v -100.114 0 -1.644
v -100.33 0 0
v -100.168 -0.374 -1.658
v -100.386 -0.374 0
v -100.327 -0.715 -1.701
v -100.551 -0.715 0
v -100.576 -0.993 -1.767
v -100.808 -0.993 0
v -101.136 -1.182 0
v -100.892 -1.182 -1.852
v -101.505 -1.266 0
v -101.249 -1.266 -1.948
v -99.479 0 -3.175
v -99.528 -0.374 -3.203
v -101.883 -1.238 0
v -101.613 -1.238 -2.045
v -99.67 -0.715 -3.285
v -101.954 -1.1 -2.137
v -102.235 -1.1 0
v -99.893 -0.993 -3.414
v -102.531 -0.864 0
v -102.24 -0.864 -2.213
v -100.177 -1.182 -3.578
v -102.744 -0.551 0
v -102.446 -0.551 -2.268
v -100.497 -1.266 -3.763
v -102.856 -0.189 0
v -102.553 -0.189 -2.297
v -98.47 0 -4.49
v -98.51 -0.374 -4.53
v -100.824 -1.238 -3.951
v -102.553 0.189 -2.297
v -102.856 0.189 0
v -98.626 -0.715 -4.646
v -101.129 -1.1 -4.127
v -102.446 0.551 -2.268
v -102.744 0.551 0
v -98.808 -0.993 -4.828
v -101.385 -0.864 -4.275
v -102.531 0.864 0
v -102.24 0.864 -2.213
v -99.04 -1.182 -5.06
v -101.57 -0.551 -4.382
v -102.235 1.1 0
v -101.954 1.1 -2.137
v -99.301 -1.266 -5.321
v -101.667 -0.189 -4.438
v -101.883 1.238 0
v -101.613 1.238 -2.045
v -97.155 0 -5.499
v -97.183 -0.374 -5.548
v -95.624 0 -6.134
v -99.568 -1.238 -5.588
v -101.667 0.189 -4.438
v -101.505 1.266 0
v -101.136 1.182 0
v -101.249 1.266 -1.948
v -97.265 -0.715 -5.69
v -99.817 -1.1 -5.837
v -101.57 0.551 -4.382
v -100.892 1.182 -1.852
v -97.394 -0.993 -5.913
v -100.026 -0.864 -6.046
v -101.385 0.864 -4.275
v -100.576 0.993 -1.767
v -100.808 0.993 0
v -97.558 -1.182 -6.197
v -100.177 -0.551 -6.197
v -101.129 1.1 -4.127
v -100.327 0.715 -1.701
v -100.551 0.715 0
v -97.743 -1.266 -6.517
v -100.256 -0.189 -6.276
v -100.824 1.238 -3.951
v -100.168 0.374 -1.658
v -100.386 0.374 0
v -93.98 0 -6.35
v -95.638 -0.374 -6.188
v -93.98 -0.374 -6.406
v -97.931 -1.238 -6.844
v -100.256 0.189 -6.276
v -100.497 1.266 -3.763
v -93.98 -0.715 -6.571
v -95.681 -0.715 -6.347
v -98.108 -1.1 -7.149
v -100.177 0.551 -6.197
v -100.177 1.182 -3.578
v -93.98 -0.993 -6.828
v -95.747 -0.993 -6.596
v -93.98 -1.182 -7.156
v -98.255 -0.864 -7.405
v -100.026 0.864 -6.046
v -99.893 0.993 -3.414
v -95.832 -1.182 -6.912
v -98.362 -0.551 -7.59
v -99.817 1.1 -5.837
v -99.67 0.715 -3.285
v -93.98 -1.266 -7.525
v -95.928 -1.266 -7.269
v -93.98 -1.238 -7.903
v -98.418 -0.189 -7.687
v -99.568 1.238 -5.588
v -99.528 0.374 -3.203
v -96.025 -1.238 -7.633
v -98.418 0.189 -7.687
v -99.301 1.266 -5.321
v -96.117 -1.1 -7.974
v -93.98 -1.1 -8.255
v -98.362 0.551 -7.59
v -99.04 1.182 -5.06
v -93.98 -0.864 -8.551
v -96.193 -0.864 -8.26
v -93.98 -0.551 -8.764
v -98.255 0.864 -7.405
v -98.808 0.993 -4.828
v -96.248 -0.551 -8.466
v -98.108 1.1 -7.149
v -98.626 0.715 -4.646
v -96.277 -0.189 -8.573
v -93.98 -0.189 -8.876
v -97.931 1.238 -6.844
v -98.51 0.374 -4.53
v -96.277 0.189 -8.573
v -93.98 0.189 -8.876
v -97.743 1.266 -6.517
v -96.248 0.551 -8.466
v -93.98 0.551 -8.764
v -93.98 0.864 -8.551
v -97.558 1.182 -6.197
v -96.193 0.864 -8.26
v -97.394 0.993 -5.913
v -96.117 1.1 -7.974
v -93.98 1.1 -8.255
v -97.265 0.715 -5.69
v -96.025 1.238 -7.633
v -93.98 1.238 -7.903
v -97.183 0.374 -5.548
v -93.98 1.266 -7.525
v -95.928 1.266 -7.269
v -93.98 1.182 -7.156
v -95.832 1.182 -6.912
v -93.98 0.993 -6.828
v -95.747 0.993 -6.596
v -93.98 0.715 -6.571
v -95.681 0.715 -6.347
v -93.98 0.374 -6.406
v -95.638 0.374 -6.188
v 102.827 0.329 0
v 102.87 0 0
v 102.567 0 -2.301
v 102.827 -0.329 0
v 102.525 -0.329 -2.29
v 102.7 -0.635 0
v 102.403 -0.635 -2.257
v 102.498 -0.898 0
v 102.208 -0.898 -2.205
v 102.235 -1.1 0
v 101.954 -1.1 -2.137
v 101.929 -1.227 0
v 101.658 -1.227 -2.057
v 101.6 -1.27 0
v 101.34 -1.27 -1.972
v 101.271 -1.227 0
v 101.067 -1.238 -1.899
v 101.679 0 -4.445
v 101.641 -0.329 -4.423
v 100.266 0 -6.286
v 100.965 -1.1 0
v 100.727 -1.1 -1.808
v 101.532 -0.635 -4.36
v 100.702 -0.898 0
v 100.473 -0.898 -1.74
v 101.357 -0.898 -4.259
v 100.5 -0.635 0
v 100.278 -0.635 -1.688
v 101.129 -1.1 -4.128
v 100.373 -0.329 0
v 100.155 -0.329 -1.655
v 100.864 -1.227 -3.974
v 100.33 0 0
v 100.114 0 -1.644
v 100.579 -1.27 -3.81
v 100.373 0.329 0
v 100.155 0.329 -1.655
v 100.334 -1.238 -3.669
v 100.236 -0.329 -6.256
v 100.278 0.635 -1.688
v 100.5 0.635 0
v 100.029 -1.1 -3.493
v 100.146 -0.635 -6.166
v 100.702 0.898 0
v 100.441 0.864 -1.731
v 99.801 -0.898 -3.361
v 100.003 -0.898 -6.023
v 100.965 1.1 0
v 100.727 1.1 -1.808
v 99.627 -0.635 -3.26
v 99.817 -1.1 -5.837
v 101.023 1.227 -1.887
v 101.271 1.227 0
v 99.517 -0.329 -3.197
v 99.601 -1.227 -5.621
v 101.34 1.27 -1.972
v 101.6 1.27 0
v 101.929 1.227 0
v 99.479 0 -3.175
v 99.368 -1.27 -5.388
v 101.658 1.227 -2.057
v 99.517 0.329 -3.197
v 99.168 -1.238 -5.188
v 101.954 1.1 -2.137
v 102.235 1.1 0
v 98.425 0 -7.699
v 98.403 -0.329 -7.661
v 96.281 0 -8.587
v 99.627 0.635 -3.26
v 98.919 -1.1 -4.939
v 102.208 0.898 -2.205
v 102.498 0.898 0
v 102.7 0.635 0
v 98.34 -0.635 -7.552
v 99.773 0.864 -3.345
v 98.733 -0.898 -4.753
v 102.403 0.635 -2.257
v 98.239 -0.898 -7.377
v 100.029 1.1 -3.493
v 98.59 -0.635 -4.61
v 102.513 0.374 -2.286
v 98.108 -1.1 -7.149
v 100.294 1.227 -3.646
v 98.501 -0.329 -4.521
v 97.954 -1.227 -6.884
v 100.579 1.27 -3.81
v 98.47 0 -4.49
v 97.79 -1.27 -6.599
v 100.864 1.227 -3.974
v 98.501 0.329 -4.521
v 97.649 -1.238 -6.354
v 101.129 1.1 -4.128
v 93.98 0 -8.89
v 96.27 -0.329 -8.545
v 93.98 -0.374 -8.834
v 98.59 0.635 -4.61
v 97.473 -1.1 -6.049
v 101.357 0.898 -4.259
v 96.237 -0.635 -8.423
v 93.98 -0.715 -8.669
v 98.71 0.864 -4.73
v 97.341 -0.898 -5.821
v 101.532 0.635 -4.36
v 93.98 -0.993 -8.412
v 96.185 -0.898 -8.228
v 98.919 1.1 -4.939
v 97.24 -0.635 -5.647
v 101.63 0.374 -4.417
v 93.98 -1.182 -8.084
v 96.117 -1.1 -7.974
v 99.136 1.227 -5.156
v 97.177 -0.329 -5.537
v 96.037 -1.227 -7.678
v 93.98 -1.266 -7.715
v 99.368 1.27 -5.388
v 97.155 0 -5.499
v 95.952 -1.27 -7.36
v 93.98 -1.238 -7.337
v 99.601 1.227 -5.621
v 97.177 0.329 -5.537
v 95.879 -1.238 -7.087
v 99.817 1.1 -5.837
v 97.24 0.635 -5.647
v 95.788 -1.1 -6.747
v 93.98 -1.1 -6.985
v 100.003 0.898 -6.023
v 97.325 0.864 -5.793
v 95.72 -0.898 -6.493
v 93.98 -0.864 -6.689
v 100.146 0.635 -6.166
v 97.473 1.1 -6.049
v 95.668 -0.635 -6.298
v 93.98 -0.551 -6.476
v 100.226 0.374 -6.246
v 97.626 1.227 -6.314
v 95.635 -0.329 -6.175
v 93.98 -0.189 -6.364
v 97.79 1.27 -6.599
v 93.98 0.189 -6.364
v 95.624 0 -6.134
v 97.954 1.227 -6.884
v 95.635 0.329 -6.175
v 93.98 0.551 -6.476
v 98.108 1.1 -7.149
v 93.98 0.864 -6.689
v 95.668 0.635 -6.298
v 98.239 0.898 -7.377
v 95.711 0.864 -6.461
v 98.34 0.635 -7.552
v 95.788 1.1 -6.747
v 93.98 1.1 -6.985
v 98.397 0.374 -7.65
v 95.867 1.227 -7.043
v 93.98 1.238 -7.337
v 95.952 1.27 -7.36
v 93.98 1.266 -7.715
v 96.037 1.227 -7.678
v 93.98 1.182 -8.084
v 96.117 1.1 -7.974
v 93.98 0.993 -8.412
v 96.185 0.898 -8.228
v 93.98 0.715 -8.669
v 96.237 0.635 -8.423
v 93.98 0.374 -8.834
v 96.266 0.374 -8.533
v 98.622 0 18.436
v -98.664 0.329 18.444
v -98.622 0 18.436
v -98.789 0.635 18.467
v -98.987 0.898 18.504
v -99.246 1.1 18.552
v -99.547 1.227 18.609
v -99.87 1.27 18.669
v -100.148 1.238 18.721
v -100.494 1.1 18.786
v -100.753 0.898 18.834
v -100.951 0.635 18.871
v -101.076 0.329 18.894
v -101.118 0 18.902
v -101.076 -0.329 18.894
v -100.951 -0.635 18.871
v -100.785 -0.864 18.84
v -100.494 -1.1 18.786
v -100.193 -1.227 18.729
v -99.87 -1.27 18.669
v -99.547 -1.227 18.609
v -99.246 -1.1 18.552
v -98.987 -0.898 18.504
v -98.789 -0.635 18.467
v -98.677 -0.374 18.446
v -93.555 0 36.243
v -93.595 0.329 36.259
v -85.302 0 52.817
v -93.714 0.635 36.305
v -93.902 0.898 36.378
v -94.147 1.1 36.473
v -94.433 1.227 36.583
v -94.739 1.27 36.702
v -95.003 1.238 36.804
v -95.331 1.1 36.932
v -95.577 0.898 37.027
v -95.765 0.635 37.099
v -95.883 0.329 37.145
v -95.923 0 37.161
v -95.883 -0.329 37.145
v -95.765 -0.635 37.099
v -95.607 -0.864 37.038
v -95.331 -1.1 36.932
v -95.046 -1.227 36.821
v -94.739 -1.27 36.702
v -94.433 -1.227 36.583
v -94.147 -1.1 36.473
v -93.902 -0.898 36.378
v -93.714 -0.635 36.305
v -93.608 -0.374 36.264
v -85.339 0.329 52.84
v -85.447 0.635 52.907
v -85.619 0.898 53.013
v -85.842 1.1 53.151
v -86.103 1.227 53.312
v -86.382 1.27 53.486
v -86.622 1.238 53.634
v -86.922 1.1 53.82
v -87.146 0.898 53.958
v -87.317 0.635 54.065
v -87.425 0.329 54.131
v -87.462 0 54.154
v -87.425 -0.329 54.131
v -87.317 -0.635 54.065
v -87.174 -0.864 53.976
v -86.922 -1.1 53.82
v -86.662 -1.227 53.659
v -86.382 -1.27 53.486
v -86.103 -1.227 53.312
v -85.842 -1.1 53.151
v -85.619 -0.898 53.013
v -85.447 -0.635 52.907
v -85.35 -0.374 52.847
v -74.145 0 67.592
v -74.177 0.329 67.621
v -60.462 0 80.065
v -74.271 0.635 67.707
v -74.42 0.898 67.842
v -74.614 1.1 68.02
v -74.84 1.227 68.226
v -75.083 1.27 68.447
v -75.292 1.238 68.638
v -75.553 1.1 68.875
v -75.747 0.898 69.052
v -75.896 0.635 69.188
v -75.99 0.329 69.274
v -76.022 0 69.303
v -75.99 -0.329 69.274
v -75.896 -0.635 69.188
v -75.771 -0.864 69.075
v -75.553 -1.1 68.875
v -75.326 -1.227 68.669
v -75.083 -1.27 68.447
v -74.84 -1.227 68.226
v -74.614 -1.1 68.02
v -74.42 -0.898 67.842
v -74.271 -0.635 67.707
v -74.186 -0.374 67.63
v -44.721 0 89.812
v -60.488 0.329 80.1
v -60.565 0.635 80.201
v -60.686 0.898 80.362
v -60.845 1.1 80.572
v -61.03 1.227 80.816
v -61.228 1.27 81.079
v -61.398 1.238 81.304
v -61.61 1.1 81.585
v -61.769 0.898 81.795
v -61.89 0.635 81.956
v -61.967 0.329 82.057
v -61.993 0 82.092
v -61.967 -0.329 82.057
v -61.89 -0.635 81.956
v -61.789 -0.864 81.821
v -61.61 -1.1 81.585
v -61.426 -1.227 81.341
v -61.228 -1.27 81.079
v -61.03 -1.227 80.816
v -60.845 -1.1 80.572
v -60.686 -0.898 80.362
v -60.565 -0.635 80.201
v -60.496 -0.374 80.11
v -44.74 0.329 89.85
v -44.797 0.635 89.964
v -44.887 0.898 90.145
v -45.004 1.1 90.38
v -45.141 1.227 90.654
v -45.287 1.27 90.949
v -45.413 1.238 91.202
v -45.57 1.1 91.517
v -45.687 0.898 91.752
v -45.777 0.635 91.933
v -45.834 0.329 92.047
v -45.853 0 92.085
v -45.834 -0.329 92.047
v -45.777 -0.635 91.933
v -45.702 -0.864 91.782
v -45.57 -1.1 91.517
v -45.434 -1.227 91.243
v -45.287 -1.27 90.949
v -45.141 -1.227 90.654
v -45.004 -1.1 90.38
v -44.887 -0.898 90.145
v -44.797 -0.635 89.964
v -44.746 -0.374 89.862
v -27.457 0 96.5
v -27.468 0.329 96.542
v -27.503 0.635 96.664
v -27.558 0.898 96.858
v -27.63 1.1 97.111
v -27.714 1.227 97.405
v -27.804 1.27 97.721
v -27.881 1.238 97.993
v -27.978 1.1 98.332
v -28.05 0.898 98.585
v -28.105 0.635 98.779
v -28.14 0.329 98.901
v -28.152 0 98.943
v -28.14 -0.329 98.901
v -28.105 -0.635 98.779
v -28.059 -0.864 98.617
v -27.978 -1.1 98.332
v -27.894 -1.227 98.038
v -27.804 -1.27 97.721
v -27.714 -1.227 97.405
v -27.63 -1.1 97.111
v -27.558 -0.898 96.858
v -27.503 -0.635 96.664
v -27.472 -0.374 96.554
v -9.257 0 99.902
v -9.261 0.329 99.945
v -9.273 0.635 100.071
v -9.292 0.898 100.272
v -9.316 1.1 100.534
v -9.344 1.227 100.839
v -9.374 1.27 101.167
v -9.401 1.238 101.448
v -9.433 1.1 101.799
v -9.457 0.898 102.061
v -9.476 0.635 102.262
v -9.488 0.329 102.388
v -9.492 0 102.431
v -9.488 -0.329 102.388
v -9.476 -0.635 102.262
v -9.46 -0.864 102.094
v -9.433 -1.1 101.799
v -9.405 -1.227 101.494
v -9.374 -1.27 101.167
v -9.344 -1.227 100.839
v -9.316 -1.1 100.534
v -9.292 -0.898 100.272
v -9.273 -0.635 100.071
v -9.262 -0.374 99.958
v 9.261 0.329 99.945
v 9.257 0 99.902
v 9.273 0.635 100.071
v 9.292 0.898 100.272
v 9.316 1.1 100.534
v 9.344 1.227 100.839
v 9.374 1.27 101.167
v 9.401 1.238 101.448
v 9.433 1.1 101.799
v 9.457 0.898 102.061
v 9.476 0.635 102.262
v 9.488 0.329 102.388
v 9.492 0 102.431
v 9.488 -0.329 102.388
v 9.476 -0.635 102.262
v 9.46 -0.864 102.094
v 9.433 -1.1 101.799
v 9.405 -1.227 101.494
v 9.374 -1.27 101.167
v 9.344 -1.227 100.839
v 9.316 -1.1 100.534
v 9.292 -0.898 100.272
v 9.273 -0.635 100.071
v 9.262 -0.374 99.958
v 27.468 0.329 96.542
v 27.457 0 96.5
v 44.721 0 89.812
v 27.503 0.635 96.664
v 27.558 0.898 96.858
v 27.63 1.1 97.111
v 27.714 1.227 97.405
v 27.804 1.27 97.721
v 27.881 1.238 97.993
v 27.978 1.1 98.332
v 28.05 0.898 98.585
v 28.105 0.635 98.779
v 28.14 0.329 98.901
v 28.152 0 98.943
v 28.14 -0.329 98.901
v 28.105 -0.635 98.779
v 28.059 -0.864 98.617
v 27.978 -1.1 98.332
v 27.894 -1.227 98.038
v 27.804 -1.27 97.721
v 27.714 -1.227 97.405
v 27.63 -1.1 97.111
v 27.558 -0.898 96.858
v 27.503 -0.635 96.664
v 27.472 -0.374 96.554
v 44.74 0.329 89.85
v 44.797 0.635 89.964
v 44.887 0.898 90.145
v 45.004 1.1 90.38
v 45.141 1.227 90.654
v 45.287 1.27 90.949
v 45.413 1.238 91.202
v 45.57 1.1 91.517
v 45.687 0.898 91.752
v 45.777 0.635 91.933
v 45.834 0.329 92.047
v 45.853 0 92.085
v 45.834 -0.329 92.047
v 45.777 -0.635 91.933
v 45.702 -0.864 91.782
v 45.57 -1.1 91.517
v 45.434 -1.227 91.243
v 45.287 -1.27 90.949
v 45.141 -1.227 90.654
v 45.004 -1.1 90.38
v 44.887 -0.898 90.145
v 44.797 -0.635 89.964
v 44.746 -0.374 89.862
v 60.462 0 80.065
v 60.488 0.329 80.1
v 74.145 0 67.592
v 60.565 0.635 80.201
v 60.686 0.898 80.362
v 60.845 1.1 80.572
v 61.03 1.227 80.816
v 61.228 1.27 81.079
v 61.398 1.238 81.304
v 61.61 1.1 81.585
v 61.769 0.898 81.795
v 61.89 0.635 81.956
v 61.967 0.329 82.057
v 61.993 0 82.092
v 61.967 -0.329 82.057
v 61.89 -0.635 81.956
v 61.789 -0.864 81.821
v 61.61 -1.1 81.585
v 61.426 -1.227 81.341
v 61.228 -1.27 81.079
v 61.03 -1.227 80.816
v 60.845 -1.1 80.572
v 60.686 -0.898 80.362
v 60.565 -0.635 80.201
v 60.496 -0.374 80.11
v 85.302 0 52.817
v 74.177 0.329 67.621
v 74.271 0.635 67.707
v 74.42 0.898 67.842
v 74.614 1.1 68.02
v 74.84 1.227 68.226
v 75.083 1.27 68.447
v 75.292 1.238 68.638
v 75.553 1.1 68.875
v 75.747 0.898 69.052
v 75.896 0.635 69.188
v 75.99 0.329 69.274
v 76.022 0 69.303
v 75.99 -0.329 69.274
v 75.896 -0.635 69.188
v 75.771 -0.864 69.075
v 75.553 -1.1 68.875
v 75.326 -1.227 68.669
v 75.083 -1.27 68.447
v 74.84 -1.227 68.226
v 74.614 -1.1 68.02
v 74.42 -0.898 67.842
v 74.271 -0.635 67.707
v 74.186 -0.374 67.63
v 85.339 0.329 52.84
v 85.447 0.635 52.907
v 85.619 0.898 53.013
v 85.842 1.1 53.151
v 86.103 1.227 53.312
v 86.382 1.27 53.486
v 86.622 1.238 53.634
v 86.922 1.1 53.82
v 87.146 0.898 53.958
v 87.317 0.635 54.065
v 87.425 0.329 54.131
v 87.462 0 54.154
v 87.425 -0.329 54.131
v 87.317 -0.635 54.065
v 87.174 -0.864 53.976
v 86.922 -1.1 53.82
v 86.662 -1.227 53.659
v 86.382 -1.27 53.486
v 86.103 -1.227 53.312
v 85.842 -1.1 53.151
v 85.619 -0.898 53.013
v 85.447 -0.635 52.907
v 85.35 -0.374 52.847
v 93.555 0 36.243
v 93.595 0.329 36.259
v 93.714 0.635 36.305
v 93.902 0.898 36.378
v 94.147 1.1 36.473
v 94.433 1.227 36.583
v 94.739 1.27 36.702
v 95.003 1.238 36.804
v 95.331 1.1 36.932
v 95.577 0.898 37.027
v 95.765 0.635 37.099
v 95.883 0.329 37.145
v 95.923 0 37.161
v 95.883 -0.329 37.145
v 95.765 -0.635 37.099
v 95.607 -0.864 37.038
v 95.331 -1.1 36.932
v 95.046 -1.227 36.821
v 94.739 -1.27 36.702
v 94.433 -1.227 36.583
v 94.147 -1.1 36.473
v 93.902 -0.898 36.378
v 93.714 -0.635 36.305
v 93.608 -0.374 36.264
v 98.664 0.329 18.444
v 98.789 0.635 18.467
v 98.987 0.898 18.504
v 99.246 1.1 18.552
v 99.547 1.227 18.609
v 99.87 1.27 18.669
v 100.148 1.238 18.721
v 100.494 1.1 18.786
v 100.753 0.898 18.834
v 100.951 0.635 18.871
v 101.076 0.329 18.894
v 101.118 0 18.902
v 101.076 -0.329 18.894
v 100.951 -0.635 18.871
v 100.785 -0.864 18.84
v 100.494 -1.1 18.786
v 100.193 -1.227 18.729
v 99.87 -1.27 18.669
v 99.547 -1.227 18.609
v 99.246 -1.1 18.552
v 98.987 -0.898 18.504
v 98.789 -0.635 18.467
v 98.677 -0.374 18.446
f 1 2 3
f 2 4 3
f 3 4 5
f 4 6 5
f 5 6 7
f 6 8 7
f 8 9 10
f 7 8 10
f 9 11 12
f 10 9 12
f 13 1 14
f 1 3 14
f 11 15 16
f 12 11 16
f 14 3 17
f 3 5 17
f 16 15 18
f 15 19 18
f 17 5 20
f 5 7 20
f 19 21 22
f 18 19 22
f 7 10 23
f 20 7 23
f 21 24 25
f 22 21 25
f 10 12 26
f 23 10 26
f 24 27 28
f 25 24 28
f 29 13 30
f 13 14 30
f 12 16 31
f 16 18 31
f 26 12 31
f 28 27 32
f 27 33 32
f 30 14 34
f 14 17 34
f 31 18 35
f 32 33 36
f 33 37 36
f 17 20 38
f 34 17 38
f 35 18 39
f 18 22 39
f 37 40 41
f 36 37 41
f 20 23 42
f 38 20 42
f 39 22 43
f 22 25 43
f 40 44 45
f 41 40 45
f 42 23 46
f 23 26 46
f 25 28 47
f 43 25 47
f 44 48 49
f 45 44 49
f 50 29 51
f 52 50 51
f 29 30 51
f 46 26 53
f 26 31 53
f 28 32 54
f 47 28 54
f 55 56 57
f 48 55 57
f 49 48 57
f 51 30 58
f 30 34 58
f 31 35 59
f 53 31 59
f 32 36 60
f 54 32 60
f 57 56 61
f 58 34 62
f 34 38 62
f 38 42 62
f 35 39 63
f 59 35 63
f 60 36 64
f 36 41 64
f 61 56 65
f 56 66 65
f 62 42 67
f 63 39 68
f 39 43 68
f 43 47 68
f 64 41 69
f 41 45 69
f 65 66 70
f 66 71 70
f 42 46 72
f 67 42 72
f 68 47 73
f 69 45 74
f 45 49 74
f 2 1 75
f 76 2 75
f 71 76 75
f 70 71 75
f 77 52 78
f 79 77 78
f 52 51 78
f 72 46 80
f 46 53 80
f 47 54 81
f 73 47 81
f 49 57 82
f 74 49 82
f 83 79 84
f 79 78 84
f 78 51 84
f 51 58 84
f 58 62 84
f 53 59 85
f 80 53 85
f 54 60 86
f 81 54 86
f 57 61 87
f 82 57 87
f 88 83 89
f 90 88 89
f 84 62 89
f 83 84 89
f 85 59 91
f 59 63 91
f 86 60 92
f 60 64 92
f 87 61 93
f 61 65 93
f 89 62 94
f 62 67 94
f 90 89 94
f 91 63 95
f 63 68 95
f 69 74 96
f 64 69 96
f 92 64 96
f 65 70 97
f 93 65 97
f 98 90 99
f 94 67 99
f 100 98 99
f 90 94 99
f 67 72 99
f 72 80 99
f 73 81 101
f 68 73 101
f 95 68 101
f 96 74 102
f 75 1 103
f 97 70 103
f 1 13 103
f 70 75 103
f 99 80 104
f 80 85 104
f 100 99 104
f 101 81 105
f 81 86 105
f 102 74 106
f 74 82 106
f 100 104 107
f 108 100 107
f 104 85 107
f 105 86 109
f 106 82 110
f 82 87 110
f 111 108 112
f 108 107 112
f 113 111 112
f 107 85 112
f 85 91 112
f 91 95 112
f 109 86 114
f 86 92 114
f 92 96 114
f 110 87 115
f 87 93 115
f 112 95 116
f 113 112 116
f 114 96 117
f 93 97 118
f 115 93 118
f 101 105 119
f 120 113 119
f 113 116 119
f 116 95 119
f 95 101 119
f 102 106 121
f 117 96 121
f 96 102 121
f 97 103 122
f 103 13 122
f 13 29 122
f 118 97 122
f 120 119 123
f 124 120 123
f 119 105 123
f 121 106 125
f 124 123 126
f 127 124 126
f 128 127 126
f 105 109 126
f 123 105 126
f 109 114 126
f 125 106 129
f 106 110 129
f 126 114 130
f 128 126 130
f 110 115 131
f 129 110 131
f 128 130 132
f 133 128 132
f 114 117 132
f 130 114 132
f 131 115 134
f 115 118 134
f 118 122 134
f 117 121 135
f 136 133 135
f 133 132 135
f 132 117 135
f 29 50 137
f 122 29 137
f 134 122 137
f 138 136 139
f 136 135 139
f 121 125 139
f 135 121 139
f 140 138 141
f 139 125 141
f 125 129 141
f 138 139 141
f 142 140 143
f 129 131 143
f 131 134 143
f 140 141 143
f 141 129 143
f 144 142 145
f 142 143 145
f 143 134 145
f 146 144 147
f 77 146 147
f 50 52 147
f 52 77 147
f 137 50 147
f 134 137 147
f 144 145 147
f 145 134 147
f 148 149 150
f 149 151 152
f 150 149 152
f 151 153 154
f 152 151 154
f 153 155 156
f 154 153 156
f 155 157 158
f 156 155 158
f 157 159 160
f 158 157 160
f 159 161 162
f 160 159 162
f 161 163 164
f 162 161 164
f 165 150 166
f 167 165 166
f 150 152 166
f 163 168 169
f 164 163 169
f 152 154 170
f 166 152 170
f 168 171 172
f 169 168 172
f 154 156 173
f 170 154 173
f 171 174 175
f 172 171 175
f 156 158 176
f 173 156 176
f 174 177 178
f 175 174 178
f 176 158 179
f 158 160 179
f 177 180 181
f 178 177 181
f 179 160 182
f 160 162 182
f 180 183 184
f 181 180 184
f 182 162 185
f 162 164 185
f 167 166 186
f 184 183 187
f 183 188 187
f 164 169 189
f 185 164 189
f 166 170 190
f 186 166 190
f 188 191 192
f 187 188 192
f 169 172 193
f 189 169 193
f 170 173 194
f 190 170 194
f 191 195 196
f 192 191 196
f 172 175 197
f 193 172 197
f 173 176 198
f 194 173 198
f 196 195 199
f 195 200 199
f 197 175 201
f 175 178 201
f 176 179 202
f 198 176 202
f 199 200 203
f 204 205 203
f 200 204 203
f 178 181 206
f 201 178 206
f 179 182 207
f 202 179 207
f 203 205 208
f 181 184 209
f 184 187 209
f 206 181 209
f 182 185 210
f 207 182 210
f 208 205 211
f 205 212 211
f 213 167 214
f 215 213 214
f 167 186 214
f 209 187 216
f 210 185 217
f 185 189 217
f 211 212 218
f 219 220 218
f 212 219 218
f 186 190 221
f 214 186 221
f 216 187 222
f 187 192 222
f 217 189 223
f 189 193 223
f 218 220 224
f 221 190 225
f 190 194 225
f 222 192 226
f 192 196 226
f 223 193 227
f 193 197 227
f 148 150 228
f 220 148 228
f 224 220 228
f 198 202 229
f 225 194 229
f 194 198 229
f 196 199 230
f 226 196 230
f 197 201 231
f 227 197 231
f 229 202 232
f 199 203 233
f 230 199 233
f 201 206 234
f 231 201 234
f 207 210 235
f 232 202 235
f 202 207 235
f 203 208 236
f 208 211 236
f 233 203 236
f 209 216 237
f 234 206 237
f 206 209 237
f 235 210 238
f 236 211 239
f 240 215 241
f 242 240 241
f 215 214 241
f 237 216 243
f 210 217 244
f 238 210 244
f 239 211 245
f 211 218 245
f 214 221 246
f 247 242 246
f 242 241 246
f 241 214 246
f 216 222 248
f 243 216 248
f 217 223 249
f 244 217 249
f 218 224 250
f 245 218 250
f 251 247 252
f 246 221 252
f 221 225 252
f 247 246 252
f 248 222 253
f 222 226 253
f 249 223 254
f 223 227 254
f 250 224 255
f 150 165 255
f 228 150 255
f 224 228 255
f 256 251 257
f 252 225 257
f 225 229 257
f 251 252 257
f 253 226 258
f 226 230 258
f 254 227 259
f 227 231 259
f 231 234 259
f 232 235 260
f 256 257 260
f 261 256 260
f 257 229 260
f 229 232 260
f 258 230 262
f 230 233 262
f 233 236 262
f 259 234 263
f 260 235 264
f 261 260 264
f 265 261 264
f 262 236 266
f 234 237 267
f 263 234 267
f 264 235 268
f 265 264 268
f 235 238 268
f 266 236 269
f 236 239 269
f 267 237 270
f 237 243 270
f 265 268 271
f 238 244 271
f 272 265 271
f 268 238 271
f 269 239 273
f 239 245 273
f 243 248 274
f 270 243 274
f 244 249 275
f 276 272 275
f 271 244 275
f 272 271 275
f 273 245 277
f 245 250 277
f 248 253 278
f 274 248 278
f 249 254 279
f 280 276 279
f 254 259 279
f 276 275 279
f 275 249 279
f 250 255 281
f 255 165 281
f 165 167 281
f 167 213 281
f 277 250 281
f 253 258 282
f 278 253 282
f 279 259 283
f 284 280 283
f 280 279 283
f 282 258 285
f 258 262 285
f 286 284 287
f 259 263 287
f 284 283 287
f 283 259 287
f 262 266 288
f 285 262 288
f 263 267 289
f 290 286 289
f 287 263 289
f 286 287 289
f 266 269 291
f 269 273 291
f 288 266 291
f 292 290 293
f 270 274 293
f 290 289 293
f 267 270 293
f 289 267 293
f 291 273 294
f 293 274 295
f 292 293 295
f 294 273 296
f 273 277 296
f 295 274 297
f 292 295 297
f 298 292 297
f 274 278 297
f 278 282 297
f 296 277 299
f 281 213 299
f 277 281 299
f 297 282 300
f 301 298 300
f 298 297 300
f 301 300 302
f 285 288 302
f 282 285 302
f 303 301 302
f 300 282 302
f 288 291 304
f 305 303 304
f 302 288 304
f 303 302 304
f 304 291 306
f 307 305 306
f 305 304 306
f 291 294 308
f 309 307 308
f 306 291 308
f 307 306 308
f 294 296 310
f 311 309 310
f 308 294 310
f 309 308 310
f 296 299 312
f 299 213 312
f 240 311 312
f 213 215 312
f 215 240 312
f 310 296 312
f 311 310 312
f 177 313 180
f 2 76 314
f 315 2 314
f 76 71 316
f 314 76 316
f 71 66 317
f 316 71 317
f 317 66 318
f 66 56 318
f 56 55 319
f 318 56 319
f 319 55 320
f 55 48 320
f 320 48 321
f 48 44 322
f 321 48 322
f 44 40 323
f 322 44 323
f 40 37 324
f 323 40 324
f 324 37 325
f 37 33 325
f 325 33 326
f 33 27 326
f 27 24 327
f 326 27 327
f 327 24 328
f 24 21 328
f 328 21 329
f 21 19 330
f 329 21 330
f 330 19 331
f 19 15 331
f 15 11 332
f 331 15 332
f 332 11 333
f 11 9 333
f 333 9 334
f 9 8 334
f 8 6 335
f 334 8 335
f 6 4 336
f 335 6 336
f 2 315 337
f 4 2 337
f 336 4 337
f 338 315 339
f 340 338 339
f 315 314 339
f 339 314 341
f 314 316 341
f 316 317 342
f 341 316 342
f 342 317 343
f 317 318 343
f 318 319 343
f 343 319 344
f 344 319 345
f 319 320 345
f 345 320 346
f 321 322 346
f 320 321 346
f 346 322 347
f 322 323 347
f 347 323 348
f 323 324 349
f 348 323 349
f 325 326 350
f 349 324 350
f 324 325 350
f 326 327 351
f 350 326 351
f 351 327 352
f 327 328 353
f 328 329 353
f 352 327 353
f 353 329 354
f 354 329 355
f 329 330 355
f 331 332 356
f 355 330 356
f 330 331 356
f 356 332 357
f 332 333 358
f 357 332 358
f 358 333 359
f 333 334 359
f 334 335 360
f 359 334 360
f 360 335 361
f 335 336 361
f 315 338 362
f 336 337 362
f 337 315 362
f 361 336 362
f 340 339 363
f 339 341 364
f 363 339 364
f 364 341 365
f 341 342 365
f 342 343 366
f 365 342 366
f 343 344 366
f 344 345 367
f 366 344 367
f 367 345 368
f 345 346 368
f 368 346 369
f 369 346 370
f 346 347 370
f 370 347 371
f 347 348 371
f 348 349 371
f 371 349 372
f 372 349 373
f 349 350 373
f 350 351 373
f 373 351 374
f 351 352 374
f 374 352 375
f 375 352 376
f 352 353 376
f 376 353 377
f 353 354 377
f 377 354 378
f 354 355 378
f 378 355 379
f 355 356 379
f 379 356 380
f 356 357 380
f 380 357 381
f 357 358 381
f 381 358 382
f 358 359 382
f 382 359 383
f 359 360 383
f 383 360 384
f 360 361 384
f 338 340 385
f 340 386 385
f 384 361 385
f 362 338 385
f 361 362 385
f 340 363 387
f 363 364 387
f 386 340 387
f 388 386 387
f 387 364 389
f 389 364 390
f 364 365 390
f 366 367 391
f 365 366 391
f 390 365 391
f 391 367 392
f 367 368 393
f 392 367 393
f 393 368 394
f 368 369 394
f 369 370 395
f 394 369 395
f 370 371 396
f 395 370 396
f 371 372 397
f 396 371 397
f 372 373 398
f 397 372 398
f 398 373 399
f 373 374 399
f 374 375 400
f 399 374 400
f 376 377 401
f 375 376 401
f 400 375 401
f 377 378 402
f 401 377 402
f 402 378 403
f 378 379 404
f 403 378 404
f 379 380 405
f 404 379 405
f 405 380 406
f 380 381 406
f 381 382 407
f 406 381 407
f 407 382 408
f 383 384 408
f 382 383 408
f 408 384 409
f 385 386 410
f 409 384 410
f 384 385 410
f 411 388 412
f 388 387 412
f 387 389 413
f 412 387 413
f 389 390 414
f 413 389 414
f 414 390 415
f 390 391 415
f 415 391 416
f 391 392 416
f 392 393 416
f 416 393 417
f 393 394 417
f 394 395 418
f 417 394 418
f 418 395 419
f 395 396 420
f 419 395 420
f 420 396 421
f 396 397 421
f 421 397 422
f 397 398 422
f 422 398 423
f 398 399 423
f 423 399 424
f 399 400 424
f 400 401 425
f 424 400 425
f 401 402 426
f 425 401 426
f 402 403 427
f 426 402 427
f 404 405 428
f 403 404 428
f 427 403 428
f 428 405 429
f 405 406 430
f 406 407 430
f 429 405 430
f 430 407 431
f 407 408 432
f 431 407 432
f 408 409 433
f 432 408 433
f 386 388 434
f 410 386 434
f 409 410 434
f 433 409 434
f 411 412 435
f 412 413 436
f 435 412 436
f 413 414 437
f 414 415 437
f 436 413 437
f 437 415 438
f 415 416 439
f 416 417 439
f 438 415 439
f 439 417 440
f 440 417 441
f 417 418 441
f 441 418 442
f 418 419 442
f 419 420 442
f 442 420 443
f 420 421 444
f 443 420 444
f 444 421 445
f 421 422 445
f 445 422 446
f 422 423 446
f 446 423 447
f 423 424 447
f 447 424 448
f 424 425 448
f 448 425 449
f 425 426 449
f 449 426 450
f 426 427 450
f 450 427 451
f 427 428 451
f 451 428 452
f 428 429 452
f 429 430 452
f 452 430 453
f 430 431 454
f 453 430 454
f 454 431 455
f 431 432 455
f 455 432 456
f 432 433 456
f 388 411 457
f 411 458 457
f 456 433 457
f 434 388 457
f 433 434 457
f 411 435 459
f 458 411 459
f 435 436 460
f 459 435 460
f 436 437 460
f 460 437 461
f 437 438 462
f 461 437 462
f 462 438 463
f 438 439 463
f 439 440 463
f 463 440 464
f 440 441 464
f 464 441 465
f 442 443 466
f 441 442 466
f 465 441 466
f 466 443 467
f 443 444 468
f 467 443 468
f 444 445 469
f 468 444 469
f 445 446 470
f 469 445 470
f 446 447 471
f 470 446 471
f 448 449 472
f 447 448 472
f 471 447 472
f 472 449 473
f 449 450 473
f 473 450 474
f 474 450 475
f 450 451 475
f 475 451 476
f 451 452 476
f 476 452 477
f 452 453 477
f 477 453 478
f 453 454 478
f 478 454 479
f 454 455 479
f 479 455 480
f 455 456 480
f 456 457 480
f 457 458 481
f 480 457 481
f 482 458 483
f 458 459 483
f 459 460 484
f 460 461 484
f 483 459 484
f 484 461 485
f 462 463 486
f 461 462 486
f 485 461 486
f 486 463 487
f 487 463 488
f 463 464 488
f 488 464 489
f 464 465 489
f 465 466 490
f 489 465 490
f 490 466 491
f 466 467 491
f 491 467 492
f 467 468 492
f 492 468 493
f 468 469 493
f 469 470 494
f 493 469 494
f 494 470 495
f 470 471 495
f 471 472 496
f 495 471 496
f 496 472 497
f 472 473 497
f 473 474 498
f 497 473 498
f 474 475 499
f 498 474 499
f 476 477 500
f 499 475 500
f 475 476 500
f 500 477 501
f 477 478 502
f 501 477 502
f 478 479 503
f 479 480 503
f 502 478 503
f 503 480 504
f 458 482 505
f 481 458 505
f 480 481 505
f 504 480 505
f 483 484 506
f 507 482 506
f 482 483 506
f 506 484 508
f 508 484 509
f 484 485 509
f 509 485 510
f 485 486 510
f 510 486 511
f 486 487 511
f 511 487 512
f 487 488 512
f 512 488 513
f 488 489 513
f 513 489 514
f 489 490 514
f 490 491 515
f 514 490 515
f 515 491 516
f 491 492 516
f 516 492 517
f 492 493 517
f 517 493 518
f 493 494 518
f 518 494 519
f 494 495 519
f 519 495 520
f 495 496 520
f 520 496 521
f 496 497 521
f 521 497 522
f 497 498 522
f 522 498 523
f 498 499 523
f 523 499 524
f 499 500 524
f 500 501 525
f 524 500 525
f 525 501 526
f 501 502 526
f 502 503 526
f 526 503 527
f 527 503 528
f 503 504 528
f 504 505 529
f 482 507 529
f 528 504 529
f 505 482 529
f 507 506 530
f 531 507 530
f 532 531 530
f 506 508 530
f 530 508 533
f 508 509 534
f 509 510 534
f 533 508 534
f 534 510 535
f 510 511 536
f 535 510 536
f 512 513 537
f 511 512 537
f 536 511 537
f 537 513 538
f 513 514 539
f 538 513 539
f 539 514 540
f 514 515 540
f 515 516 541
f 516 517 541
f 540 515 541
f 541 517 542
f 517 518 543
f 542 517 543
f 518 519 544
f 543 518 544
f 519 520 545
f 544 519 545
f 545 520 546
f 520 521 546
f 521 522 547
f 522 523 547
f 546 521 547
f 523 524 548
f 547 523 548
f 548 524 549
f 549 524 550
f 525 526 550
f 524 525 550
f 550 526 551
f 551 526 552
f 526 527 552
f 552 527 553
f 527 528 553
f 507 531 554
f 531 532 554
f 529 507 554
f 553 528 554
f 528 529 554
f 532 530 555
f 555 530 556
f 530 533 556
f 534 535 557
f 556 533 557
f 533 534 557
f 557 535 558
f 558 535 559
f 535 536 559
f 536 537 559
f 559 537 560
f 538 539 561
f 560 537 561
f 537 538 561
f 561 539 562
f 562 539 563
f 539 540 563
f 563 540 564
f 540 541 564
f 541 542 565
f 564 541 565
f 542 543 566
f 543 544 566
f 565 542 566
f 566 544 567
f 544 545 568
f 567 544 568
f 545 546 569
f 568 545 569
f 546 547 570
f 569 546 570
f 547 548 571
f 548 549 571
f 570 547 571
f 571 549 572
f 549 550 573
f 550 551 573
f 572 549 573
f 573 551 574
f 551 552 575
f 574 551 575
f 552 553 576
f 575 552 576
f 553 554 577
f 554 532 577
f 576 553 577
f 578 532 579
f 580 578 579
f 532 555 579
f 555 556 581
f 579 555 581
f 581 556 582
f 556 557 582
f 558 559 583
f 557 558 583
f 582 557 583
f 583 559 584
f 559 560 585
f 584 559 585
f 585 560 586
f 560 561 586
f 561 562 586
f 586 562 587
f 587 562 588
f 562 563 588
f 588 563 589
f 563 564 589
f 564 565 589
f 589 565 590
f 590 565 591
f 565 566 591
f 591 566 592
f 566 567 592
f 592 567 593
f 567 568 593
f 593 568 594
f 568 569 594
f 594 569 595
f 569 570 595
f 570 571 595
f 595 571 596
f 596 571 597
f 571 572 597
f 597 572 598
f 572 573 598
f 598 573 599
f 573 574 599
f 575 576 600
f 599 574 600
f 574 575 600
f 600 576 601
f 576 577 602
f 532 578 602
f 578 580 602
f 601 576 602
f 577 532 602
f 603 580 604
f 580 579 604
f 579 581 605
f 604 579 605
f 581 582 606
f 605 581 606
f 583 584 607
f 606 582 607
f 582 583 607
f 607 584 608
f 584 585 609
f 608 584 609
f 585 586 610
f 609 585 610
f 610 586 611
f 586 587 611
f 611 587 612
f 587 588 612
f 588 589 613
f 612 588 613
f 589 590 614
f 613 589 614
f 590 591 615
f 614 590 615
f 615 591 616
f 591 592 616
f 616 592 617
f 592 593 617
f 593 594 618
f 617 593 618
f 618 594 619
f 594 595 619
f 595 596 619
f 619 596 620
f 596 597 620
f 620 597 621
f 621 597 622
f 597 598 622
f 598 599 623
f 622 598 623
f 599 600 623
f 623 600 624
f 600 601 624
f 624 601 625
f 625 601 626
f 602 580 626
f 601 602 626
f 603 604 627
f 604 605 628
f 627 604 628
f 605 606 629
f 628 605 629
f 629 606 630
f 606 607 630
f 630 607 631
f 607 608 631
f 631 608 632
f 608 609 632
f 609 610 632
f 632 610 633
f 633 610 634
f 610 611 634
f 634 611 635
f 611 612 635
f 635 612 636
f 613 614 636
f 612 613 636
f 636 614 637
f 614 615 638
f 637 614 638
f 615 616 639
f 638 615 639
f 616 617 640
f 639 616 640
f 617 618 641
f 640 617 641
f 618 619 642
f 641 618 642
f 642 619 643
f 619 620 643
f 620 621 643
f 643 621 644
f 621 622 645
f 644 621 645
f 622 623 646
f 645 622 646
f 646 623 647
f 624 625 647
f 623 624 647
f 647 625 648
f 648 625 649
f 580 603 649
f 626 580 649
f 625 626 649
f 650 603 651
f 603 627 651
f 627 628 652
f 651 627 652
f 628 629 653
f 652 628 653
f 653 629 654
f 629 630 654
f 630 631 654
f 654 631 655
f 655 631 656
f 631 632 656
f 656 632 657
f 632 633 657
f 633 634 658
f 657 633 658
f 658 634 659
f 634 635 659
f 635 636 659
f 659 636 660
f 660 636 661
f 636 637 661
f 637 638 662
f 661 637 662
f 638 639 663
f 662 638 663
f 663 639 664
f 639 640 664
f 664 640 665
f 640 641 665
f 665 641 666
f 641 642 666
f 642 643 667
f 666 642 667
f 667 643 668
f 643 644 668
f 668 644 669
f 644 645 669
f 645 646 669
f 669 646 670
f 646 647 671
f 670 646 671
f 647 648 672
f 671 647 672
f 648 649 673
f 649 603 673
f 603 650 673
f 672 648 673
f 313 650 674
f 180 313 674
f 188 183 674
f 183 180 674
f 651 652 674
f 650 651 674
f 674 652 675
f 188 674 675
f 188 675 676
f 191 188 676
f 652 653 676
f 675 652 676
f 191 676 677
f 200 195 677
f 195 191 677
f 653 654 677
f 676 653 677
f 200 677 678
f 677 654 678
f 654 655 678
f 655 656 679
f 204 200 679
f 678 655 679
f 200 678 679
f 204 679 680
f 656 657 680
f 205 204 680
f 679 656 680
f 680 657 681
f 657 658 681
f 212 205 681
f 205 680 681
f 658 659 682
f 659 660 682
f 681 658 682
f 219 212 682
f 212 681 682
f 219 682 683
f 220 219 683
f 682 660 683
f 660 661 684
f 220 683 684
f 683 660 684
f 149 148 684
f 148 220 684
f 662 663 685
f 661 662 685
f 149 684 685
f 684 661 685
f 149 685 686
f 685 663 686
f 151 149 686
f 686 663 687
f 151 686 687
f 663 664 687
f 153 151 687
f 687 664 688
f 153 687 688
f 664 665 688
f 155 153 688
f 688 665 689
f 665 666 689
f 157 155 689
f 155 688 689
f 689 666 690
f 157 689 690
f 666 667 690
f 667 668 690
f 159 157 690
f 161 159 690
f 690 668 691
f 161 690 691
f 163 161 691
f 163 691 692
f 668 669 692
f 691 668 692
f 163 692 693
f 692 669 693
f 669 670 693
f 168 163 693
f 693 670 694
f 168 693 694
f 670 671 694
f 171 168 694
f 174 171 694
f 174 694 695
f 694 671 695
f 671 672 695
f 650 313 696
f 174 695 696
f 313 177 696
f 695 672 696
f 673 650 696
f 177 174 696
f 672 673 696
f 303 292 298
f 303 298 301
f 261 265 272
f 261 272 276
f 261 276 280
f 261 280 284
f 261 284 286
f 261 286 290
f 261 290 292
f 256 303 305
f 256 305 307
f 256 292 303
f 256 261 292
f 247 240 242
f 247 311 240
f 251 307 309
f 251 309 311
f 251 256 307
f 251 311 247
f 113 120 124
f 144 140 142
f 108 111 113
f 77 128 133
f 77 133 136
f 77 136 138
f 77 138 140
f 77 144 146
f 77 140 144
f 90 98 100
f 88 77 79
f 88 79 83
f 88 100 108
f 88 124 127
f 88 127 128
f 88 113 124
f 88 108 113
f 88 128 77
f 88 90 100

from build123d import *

# Parameters (mm, degrees)
F0_R     = 1.27
F2_W     = 246.2176010013
F2_H     = 106.0751006007
F3_DEPTH = 25.4
F4_DEPTH = 51.308
F6_ANGLE = 90
F7_R     = 1.27
F8_ANGLE = 90


with BuildPart() as f1:
    # F0 (on Top) → F1 (revolve)
    with BuildSketch(Plane.XY):
        with Locations((-101.6, 0)):
            Circle(F0_R)
    revolve(axis=Axis((0, 8.5233533755, 0), (0, 1, 0)))

    # F2 (on Front) → F3 (cut)
    with BuildSketch(Plane.XZ):
        with Locations((10.4999132454, -53.0375503004)):
            Rectangle(F2_W, F2_H)
    extrude(amount=-F3_DEPTH, mode=Mode.SUBTRACT)

    # F2 (on Front) → F4 (cut)
    with BuildSketch(Plane.XZ):
        with Locations((10.4999132454, -53.0375503004)):
            Rectangle(F2_W, F2_H)
    extrude(amount=F4_DEPTH, mode=Mode.SUBTRACT)

    # F5 (on face) → F6 (revolve)
    with BuildSketch(Plane(origin=(0, 0, 0), x_dir=(1, 0, 0), z_dir=(0, 0, -1))):
        with BuildLine():
            ThreePointArc((100.33, 0), (101.6, -1.27), (102.87, 0))
            ThreePointArc((102.87, 0), (101.6, 1.27), (100.33, 0))
        make_face()
    revolve(axis=Axis((93.98, -0.709965534, 0), (0, 1, 0)), revolution_arc=F6_ANGLE)

    # F7 (on face) → F8 (revolve)
    with BuildSketch(Plane(origin=(0, 0, 0), x_dir=(1, 0, 0), z_dir=(0, 0, -1))):
        with Locations((-101.6, 0)):
            Circle(F7_R)
    revolve(axis=Axis((-93.98, -1.0185919236, 0), (0, -1, 0)), revolution_arc=F8_ANGLE)


solid = f1.part
